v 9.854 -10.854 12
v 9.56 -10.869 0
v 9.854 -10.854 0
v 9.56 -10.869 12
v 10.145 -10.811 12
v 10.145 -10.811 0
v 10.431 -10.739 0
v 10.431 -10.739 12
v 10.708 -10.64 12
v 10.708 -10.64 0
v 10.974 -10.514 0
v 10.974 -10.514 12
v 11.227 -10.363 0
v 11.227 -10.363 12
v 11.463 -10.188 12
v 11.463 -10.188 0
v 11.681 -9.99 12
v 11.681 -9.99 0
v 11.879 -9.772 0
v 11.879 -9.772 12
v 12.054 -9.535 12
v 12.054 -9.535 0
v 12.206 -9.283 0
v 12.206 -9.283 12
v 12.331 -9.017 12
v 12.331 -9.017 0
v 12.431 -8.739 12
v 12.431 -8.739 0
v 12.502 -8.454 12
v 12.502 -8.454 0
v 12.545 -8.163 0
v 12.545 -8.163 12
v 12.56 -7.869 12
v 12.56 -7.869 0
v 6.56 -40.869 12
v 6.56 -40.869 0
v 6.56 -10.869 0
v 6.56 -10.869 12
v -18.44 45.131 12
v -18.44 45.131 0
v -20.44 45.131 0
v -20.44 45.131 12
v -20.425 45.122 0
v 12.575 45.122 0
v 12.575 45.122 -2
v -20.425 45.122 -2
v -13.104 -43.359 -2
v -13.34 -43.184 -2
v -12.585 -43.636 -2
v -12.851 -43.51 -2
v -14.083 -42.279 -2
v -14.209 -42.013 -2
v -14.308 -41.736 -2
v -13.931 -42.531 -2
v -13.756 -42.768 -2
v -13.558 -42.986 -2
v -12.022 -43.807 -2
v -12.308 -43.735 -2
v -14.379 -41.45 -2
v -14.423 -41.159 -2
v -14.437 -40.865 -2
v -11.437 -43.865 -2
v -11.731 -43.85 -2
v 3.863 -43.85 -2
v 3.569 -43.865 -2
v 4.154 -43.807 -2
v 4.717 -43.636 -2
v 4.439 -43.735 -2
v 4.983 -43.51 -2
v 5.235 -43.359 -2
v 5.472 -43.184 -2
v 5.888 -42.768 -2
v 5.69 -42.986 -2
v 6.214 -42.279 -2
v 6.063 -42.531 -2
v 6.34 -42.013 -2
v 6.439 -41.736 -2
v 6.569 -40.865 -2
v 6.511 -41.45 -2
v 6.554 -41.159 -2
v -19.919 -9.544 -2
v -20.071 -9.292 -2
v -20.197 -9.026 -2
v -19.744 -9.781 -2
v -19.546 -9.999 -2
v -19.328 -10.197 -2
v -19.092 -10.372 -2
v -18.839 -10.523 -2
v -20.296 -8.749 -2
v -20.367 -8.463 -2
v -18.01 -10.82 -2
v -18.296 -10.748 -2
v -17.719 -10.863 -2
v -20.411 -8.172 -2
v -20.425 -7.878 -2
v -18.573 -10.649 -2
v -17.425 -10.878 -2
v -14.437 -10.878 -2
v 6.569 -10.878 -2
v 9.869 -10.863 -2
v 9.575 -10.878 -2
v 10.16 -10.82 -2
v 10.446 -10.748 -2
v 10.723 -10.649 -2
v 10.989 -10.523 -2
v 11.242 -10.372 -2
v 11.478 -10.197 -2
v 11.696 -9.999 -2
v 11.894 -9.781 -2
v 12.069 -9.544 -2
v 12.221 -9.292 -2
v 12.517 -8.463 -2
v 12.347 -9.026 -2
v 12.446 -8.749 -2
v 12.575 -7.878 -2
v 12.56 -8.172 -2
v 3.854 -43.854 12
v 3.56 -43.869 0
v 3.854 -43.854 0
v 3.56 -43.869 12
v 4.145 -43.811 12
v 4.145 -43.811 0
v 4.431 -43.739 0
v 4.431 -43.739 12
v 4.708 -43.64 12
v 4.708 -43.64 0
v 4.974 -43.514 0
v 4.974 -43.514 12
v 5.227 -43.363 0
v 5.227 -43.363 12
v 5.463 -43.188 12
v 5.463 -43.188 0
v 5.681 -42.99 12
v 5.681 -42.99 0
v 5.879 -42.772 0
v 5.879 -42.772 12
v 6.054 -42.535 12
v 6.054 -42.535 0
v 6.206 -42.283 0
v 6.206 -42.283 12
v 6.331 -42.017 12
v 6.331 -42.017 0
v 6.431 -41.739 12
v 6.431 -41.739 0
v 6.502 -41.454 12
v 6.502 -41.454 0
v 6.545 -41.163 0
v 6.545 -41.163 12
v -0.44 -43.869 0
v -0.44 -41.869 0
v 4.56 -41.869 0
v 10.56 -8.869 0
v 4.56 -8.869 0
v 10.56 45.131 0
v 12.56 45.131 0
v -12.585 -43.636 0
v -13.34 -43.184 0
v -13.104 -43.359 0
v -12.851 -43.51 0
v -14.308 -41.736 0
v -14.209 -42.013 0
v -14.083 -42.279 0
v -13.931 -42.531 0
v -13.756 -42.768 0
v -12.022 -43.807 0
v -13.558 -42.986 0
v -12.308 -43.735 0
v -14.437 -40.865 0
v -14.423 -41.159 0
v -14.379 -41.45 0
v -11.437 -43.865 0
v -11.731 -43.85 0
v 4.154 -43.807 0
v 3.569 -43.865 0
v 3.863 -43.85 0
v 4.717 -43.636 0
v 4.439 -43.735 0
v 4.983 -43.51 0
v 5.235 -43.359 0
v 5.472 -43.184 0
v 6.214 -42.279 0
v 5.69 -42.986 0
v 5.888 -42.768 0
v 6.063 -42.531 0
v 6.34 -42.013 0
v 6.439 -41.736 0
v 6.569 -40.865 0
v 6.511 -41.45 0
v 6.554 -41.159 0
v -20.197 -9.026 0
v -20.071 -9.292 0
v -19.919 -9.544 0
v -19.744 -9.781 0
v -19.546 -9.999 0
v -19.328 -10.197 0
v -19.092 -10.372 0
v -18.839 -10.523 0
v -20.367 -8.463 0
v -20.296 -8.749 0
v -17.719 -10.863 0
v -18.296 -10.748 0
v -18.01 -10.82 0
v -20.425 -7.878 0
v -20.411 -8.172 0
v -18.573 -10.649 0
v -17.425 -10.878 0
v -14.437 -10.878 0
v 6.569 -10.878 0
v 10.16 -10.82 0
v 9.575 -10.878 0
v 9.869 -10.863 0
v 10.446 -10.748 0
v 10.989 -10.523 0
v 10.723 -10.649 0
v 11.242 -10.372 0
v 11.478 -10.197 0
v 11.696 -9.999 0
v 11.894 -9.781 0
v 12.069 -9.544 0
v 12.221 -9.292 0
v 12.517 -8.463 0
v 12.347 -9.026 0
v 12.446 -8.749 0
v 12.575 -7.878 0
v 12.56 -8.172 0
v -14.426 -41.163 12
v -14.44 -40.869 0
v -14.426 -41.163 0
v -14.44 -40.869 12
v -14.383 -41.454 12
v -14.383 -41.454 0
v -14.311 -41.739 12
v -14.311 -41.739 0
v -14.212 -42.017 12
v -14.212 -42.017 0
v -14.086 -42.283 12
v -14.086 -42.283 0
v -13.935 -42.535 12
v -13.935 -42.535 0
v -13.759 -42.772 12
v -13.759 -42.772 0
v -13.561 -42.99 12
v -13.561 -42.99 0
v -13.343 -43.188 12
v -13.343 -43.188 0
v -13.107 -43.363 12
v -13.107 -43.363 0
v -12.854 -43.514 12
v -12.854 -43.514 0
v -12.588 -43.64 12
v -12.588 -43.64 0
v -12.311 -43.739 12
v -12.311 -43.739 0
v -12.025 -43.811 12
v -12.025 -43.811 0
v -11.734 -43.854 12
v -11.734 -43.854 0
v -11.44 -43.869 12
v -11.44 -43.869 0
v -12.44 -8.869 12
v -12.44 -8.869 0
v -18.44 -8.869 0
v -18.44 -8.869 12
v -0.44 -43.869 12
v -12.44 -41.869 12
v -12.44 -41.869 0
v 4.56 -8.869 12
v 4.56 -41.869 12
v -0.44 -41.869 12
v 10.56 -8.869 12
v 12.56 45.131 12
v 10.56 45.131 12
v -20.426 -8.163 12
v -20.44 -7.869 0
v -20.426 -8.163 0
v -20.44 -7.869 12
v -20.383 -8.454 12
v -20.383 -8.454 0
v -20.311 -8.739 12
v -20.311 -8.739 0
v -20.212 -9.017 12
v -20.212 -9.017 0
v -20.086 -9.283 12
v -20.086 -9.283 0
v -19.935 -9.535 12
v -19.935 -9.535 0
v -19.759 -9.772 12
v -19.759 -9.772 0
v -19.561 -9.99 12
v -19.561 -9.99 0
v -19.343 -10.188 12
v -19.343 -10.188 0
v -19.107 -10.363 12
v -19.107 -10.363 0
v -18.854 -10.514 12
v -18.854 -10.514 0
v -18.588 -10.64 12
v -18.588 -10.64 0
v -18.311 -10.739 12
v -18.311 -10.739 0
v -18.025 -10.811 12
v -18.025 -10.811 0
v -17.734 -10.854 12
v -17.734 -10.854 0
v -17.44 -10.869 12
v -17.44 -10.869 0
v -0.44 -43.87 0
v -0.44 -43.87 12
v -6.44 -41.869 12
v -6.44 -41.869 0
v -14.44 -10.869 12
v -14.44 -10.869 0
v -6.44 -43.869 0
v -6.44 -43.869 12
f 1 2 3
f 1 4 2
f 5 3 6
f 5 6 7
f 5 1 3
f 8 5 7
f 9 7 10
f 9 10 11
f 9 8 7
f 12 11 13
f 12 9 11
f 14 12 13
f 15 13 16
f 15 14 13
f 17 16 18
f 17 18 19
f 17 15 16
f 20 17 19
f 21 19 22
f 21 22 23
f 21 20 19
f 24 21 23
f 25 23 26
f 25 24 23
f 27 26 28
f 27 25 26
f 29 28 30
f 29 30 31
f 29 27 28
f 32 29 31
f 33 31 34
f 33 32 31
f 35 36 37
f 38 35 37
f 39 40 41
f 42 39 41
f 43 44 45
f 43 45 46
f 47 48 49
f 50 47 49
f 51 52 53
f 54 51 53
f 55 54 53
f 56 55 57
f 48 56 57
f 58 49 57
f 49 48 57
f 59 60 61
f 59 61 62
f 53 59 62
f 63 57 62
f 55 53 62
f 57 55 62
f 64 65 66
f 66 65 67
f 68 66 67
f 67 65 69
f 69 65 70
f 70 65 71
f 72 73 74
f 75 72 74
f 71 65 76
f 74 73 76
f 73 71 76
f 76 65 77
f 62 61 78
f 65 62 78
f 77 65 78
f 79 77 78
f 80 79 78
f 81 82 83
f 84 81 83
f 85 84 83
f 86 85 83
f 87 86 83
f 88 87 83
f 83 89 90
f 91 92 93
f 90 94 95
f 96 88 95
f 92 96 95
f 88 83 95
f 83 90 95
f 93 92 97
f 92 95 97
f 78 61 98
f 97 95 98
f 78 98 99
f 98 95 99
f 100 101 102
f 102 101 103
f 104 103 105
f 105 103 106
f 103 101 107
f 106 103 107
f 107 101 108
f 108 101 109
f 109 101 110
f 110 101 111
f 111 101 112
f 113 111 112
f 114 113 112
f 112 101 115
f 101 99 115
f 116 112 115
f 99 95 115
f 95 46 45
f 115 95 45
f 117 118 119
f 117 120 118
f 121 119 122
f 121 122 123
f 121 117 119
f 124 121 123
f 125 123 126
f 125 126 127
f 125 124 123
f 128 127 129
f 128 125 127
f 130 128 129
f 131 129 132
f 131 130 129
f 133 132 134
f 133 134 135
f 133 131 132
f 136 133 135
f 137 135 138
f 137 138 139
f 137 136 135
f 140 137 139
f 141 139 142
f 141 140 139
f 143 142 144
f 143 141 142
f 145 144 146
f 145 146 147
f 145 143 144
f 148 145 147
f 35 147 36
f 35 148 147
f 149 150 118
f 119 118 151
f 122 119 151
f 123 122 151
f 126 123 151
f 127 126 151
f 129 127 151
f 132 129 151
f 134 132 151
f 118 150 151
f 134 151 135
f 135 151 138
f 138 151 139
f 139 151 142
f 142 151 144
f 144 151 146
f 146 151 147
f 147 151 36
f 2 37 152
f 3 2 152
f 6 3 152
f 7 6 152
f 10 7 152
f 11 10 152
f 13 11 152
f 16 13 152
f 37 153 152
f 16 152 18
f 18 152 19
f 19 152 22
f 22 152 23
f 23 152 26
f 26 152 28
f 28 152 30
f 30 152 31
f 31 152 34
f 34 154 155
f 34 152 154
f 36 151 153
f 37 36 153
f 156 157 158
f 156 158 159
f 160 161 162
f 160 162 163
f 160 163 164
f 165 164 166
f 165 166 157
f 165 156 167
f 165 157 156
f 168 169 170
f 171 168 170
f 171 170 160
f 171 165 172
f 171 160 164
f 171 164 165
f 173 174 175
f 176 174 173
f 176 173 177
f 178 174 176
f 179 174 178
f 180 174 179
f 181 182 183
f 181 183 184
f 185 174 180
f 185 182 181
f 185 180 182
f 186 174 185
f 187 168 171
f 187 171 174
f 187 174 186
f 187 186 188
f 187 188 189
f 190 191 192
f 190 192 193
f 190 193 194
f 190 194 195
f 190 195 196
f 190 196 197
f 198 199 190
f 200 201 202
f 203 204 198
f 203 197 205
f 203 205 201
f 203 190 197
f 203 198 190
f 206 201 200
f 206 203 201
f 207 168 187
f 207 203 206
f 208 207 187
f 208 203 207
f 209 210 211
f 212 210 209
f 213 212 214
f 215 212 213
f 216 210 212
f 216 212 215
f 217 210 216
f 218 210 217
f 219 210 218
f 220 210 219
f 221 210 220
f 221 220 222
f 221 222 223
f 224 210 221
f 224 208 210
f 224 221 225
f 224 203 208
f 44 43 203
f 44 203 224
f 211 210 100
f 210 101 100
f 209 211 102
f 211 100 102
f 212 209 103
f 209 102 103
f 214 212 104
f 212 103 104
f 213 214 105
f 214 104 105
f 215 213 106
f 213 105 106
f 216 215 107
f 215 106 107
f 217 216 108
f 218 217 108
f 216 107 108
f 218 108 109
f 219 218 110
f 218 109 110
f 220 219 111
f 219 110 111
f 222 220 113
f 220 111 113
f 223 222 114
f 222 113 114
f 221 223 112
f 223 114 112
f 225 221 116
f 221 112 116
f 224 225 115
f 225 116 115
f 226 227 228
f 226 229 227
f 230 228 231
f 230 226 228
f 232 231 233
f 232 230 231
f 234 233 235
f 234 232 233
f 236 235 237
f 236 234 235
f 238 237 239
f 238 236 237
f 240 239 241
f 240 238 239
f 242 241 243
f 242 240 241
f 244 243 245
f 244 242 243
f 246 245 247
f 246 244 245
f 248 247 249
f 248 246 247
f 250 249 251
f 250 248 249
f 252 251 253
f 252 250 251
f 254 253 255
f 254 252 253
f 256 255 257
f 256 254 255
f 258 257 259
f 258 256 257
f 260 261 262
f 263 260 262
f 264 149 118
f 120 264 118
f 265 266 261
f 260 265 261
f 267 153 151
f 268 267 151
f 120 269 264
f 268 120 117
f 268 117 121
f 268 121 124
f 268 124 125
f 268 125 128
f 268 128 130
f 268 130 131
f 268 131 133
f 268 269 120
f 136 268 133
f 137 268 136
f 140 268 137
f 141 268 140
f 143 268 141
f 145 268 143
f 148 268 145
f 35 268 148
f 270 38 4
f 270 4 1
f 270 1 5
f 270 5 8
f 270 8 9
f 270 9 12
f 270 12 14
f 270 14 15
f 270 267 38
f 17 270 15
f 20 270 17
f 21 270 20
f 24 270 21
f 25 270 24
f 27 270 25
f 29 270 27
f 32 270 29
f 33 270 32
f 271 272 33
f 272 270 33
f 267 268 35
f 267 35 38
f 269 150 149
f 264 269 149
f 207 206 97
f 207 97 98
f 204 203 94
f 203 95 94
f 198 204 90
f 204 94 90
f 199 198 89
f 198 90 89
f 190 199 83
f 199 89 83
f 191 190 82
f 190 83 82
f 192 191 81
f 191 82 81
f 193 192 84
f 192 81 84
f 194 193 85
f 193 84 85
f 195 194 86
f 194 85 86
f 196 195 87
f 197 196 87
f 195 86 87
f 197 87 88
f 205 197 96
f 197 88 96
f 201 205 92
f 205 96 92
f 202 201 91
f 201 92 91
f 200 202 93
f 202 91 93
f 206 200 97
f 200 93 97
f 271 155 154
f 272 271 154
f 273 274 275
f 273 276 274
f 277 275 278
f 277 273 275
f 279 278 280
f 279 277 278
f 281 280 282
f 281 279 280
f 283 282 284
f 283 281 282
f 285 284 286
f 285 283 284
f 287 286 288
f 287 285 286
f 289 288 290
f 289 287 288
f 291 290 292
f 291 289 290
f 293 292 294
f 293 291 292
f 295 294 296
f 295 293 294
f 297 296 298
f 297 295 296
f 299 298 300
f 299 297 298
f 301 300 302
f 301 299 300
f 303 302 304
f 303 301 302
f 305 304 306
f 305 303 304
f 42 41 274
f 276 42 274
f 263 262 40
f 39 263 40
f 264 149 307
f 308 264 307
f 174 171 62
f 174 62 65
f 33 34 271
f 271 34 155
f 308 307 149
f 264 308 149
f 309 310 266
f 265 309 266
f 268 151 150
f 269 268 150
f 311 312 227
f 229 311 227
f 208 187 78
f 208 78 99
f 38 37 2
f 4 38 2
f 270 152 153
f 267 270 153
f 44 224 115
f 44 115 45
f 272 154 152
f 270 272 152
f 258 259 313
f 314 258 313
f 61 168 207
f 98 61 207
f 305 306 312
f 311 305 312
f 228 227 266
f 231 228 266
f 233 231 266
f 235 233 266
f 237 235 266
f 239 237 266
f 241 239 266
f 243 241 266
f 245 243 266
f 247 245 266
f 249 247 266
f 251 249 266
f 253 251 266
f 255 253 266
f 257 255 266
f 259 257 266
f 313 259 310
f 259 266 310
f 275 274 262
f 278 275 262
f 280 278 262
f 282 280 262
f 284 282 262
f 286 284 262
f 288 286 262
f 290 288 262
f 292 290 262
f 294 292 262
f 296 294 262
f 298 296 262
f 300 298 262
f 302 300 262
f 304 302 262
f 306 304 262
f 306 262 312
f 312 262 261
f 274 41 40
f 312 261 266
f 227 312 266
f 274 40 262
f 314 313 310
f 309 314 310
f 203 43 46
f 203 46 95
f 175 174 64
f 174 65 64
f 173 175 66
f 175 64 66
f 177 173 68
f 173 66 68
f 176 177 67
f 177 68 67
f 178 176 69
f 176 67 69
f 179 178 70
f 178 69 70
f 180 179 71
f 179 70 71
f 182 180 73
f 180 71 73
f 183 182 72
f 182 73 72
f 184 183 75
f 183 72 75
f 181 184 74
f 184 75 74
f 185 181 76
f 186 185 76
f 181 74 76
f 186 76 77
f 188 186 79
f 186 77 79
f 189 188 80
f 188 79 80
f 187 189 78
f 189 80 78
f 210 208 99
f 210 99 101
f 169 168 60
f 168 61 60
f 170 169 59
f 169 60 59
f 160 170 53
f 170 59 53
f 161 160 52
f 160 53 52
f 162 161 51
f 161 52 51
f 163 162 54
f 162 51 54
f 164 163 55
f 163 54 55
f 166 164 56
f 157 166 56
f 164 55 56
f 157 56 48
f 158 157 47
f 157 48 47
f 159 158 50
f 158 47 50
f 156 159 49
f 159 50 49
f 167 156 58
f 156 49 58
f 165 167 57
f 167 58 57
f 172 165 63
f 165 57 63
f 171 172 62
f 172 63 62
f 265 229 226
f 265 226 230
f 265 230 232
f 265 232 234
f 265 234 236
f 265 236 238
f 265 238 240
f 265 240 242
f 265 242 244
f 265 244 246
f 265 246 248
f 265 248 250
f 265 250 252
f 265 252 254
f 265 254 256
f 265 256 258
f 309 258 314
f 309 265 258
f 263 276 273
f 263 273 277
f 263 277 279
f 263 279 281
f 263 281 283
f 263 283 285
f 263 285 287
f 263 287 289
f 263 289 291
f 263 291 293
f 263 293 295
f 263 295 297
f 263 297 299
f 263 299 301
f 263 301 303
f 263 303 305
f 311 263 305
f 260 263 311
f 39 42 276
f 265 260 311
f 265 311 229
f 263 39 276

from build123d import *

# Parameters (mm, degrees)
F1_DEPTH = 12
F2_W     = 21.0055973778
F2_H     = 32.9869928685
F3_DEPTH = 2
F4_R     = 3
F4_2_R   = 3
F4_3_R   = 3


with BuildPart() as f1:
    # F0 (on Top) → F1 (new body)
    with BuildSketch(Plane.XY):
        Polygon((-18.4401693158, 45.1313681013), (-20.4401693158, 45.1313681013), (-20.4401693158, -8.8686318987), (-20.4401693158, -10.8686318987), (-14.4401693158, -10.8686318987), (-14.4401693158, -43.8686318987), (-6.4401693158, -43.8686318987), (-6.4401693158, -41.8686318987), (-12.4401693158, -41.8686318987), (-12.4401693158, -8.8686318987), (-18.4401693158, -8.8686318987), align=None)
    extrude(amount=F1_DEPTH)

    # F4
    f4_edges = [f1.edges().sort_by_distance(p)[0] for p in [
        (-20.440169, -10.868632, 6),
        (-14.440169, -43.868632, 6),
    ]]
    fillet(f4_edges, radius=F4_R)


with BuildPart() as f1b:
    # F0 (on Top) → F1, piece 2 (new body)
    with BuildSketch(Plane.XY):
        Polygon((12.5598306842, 45.1313681013), (10.5598306842, 45.1313681013), (10.5598306842, -8.8686318987), (4.5598306842, -8.8686318987), (4.5598306842, -41.8686318987), (-0.4401693158, -41.8686318987), (-0.4401693158, -43.8686318987), (6.5598306842, -43.8686318987), (6.5598306842, -10.8686318987), (12.5598306842, -10.8686318987), (12.5598306842, -8.8686318987), align=None)
    extrude(amount=F1_DEPTH)

    # F4#2
    f4_2_edges = [f1b.edges().sort_by_distance(p)[0] for p in [
        (6.559831, -43.868632, 6),
        (12.559831, -10.868632, 6),
    ]]
    fillet(f4_2_edges, radius=F4_2_R)


with BuildPart() as f1c:
    # F0 (on Top) → F1, piece 3 (new body)
    with BuildSketch(Plane.XY):
        Polygon((-0.4401693158, -43.8701787744), (-0.4401693158, -43.8686318987), (-0.4404736794, -43.8686318987), align=None)
    extrude(amount=F1_DEPTH)


with BuildPart() as f3:
    # F2 (on Top) → F3 (new body)
    with BuildSketch(Plane.XY):
        Polygon((12.5749358821, 45.1223217276), (-20.4250641179, 45.1223217276), (-20.4250641179, -10.8776782724), (-14.4370612154, -10.8776782724), (6.5685361624, -10.8776782724), (12.5749358821, -10.8776782724), align=None)
        with Locations((-3.9342625265, -27.3711747067)):
            Rectangle(F2_W, F2_H)
    extrude(amount=-F3_DEPTH)

    # F4#3
    f4_3_edges = [f3.edges().sort_by_distance(p)[0] for p in [
        (-14.437061, -43.864671, -1),
        (6.568536, -43.864671, -1),
        (12.574936, -10.877678, -1),
        (-20.425064, -10.877678, -1),
    ]]
    fillet(f4_3_edges, radius=F4_3_R)


solid = Compound([f1.part, f1b.part, f1c.part, f3.part])
